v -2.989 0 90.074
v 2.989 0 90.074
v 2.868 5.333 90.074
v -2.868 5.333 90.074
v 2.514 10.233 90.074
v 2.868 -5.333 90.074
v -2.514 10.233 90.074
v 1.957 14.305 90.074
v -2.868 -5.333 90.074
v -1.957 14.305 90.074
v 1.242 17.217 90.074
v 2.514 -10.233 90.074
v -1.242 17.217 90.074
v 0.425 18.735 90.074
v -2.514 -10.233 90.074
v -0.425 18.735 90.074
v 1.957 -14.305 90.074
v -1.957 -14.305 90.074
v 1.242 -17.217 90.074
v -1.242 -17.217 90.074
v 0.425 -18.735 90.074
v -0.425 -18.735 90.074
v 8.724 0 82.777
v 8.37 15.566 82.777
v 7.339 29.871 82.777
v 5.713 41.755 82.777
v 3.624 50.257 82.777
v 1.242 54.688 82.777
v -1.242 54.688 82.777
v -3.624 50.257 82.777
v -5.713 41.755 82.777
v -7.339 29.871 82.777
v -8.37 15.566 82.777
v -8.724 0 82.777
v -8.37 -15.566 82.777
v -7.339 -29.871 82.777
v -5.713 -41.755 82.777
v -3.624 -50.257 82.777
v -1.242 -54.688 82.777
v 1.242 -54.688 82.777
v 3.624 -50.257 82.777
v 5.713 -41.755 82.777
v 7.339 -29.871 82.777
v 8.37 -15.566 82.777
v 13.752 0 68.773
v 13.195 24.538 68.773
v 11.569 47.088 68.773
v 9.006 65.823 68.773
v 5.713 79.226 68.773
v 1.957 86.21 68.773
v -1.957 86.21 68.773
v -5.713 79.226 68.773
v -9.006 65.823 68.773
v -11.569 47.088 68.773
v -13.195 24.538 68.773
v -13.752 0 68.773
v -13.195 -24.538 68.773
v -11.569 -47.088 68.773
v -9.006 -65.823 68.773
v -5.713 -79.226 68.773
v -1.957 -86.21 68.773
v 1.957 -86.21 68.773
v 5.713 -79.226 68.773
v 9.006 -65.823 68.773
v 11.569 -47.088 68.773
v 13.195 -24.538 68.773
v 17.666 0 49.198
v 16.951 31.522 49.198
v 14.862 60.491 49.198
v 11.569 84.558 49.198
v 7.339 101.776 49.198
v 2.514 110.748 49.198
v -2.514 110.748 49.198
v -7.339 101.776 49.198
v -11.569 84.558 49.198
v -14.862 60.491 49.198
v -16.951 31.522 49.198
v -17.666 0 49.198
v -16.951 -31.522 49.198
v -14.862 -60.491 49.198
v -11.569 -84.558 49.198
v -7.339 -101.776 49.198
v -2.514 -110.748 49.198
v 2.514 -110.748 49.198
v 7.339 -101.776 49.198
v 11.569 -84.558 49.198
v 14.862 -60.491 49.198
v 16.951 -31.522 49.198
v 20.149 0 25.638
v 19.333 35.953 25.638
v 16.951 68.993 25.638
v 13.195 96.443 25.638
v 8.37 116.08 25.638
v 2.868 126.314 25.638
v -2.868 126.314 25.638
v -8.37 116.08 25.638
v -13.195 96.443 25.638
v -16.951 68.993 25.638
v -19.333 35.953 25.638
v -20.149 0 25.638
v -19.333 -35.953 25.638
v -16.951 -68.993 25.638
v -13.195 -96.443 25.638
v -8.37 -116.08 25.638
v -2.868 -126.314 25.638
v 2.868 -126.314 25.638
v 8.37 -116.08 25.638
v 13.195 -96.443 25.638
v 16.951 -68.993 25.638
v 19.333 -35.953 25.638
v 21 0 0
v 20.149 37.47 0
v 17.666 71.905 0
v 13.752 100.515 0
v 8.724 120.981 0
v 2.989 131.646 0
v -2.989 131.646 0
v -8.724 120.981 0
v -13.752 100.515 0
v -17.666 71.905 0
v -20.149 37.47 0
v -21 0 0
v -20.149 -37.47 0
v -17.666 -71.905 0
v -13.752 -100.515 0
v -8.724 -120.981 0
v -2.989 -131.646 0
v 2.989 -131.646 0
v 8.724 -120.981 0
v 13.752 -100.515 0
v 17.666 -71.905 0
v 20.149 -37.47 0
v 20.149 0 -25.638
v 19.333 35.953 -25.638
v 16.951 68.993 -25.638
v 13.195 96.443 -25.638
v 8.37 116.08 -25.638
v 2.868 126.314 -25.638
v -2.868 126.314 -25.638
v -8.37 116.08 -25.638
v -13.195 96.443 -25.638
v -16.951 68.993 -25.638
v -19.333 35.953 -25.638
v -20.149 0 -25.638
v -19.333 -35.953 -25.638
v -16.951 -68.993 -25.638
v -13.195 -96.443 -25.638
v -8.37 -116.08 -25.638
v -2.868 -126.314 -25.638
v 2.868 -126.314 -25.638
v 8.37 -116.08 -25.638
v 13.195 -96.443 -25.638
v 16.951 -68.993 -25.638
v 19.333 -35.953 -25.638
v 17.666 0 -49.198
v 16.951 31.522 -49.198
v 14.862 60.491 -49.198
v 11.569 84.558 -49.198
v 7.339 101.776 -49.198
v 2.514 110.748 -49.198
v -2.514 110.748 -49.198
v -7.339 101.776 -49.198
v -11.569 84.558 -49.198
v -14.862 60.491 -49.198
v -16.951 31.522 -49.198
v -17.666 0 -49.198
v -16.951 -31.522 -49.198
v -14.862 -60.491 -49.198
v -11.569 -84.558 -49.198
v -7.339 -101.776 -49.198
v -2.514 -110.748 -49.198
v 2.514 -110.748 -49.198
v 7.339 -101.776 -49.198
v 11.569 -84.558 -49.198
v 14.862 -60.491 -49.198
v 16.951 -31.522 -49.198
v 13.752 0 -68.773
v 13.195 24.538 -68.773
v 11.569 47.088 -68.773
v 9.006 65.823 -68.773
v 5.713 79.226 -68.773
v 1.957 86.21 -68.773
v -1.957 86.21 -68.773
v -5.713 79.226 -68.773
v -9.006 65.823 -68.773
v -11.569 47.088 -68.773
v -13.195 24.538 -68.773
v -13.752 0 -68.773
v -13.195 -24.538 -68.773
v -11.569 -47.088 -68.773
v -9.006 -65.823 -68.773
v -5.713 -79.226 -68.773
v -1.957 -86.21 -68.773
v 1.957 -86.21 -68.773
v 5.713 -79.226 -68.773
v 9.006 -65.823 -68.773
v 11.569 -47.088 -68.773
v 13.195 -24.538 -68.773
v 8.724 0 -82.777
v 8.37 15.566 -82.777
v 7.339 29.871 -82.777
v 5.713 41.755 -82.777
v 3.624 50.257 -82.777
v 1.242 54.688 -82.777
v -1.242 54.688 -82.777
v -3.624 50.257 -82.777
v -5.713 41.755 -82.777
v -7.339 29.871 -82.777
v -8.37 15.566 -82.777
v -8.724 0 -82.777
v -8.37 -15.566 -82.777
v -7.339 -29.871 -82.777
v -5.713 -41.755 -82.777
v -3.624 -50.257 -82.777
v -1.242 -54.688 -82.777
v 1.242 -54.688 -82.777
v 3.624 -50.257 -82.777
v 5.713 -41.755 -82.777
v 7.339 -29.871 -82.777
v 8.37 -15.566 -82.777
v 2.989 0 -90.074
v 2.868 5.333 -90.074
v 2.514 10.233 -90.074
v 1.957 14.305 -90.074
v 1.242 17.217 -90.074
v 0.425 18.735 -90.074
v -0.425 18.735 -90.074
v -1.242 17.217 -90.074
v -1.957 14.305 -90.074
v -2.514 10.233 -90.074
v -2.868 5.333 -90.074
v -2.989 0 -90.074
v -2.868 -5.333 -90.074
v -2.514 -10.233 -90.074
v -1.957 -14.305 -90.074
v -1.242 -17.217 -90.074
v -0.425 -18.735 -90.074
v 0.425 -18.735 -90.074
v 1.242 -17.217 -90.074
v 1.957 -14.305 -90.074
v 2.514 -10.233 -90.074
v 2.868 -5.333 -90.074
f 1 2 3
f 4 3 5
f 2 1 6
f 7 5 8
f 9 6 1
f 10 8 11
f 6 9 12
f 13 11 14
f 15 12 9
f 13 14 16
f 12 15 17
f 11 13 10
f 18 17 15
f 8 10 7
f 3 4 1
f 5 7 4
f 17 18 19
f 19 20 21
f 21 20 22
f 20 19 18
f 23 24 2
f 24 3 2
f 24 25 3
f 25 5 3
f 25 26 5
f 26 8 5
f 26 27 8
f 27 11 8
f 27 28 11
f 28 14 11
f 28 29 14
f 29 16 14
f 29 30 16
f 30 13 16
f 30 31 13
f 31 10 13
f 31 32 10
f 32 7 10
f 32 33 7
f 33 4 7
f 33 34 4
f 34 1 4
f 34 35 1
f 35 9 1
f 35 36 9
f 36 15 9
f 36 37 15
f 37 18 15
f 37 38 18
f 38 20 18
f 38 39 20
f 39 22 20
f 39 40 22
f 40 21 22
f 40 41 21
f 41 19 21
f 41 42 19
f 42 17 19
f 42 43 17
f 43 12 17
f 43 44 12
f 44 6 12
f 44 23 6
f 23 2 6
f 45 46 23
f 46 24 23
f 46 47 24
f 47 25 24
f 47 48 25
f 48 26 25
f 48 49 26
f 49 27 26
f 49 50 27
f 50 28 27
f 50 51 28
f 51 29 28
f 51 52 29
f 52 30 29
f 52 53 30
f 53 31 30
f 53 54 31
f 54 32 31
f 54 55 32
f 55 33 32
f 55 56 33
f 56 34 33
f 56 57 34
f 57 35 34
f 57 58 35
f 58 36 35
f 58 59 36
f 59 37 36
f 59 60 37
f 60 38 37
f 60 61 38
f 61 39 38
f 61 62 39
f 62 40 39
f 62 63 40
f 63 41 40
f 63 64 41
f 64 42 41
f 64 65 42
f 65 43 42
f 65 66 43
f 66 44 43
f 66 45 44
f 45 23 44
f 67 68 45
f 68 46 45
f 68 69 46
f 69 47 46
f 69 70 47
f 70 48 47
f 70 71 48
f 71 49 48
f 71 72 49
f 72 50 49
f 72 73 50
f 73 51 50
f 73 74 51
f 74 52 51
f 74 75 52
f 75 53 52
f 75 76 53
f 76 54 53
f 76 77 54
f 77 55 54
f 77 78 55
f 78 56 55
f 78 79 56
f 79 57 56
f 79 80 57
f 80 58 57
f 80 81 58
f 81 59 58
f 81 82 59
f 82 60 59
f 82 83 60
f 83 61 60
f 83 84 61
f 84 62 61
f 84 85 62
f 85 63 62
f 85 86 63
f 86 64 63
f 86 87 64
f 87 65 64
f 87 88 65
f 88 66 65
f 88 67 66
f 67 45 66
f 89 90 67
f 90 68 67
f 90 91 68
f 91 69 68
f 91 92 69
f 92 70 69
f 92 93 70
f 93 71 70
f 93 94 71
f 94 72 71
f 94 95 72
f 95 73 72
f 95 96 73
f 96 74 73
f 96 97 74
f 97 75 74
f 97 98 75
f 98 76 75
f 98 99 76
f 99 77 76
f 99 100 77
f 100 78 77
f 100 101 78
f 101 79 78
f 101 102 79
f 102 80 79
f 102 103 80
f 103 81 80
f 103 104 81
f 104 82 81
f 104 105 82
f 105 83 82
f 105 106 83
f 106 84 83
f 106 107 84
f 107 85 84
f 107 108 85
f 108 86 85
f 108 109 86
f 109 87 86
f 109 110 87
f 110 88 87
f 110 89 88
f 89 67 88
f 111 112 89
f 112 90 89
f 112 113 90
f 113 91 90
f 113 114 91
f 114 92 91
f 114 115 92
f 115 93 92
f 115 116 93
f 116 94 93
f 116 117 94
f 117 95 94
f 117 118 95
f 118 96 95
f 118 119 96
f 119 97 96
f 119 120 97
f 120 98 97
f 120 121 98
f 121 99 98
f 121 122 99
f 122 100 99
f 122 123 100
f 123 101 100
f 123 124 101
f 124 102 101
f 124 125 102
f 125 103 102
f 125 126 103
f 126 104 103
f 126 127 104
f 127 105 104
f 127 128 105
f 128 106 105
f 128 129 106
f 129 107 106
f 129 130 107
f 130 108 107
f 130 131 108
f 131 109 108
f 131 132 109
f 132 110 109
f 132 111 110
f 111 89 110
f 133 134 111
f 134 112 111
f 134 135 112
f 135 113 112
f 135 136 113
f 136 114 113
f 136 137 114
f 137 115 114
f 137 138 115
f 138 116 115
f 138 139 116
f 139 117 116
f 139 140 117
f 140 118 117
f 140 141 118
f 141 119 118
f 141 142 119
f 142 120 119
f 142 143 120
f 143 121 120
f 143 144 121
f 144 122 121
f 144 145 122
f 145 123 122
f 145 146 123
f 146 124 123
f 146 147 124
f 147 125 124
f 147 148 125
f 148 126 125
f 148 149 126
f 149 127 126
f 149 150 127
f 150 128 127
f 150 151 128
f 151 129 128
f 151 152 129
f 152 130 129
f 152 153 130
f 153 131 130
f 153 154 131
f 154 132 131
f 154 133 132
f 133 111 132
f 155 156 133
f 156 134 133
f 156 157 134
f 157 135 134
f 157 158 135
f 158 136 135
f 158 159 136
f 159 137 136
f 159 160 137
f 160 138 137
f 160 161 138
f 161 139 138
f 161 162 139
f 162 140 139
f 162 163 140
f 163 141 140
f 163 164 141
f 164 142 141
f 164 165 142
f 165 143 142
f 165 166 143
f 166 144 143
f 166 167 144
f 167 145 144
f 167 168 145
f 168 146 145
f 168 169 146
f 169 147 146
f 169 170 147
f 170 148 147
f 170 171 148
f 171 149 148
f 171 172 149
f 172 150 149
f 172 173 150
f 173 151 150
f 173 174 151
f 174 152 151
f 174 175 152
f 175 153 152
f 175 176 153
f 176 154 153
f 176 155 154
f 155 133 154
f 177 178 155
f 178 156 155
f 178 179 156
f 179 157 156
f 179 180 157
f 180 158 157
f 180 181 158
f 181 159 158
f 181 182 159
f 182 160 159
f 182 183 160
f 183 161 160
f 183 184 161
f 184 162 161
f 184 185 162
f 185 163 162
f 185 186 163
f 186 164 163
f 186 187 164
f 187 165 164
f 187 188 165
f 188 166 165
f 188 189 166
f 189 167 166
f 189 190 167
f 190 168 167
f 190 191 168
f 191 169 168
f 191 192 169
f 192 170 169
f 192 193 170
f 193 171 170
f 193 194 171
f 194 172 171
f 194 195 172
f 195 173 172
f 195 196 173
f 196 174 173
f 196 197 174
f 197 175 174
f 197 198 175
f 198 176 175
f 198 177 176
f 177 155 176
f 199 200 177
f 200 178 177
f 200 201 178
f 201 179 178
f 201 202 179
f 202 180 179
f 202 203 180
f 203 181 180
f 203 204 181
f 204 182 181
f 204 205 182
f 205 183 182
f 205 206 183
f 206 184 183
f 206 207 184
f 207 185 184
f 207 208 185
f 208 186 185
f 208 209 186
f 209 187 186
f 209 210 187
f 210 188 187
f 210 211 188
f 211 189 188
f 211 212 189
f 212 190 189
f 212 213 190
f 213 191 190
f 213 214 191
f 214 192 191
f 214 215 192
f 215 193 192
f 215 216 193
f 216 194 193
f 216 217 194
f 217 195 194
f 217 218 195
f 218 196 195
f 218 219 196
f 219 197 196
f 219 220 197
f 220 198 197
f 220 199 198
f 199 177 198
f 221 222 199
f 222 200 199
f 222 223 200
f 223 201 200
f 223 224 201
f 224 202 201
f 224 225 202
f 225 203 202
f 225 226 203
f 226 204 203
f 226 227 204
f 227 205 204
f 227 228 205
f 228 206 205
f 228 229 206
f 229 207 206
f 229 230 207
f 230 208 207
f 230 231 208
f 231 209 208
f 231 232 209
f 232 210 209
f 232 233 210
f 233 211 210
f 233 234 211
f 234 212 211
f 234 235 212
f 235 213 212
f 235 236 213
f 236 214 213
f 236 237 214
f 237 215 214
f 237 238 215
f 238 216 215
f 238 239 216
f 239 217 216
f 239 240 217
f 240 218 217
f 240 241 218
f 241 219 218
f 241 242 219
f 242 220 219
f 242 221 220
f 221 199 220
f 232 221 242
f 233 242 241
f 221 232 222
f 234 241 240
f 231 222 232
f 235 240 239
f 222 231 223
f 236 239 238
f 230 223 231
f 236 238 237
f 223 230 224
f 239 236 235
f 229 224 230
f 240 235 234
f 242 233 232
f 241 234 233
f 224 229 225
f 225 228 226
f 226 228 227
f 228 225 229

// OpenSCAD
// Generated by SolidPython 1.0.1 on 2020-07-29 00:46:46


scale(v = [3, 19, 13]) {
	sphere(r = 7);
}
/***********************************************
*********      SolidPython code:      **********
************************************************
 
# import packages: SolidPython
from solid import *
from solid.utils import *
from itertools import chain, combinations, permutations


class Resize:

    def __init__(self, scad_file):
        self.scad_file = scad_file
        #self.scad_file = import_scad(scad_file)
        # cone/cylinder param:
        self.r1 = 0
        self.r2 = 0
        self.h = 0
        # rectangular prism param:
        self.w = 0
        self.l = 0
        # ellipse param:
        self.r = 0

    # import OpenScad code (file name corresponds to shape)


    # classify shape + parameters
    def assign(self, param1, param2, param3):
        if self.scad_file == 'cone.scad':
            self.r1 = param1
            self.r2 = param2
            self.h = param3
        elif self.scad_file == 'cylinder.scad':
            self.r1 = param1
            self.r2 = param2
            self.h = param3
        elif self.scad_file == 'rectangularPrism.scad':
            self.h = param1
            self.l = param2
            self.w = param3
        else:
            self.r = param1
            self.h = param2

    # resize parameters
    def iterate(self):
        x = range(3, 20, 2)
        i = 1
        if self.scad_file == 'cone.scad':
            tempList = list(permutations(x, 2))
            for temp in tempList:
                param1 = temp[0]
                param2 = temp[1]
                filepath = 'produced_scad_files/' + 'cone' + str(param1) + '_' + str(param2) + '_' + '.scad'
                scad_render_to_file(cylinder(h=param1, r1=param2, r2=0), filepath)

        elif self.scad_file == 'cylinder.scad':
            tempList = list(permutations(x, 3))
            for temp in tempList:
                param1 = temp[0]
                param2 = temp[1]
                filepath = 'produced_scad_files/' + 'cylinder' + str(param1) + '_' + str(param2) + '_' + '.scad'
                scad_render_to_file(cylinder(h=param1, r1=param2, r2=param2), filepath)

        elif self.scad_file == 'rectangularPrism.scad':
            tempList = list(permutations(x, 3))
            for temp in tempList:
                param1 = temp[0]
                param2 = temp[1]
                param3 = temp[2]
                filepath = 'produced_scad_files/' + 'rectangularPrism' + str(param1) + '_' + str(param2) + '_' + str(
                    param3) + '.scad'
                scad_render_to_file(cube(size=(param1, param2, param3)), filepath)

        elif self.scad_file == 'ellipse.scad':
            tempList = list(permutations(x, 4))
            for temp in tempList:
                param1 = temp[0]
                param2 = temp[1]
                param3 = temp[2]
                param4 = temp[3]
                filepath = 'produced_scad_files/' + 'ellipse' + str(param1) + '_' + str(param2) + '_' + str(param3) + '_' + str(param4) + '.scad'
                scad_render_to_file(scale([param1, param2, param3])(sphere(r=param4)), filepath)

    def render_to_scadfile(self):
        scad_render_to_file(scad, 'example.scad') 
 
************************************************/
